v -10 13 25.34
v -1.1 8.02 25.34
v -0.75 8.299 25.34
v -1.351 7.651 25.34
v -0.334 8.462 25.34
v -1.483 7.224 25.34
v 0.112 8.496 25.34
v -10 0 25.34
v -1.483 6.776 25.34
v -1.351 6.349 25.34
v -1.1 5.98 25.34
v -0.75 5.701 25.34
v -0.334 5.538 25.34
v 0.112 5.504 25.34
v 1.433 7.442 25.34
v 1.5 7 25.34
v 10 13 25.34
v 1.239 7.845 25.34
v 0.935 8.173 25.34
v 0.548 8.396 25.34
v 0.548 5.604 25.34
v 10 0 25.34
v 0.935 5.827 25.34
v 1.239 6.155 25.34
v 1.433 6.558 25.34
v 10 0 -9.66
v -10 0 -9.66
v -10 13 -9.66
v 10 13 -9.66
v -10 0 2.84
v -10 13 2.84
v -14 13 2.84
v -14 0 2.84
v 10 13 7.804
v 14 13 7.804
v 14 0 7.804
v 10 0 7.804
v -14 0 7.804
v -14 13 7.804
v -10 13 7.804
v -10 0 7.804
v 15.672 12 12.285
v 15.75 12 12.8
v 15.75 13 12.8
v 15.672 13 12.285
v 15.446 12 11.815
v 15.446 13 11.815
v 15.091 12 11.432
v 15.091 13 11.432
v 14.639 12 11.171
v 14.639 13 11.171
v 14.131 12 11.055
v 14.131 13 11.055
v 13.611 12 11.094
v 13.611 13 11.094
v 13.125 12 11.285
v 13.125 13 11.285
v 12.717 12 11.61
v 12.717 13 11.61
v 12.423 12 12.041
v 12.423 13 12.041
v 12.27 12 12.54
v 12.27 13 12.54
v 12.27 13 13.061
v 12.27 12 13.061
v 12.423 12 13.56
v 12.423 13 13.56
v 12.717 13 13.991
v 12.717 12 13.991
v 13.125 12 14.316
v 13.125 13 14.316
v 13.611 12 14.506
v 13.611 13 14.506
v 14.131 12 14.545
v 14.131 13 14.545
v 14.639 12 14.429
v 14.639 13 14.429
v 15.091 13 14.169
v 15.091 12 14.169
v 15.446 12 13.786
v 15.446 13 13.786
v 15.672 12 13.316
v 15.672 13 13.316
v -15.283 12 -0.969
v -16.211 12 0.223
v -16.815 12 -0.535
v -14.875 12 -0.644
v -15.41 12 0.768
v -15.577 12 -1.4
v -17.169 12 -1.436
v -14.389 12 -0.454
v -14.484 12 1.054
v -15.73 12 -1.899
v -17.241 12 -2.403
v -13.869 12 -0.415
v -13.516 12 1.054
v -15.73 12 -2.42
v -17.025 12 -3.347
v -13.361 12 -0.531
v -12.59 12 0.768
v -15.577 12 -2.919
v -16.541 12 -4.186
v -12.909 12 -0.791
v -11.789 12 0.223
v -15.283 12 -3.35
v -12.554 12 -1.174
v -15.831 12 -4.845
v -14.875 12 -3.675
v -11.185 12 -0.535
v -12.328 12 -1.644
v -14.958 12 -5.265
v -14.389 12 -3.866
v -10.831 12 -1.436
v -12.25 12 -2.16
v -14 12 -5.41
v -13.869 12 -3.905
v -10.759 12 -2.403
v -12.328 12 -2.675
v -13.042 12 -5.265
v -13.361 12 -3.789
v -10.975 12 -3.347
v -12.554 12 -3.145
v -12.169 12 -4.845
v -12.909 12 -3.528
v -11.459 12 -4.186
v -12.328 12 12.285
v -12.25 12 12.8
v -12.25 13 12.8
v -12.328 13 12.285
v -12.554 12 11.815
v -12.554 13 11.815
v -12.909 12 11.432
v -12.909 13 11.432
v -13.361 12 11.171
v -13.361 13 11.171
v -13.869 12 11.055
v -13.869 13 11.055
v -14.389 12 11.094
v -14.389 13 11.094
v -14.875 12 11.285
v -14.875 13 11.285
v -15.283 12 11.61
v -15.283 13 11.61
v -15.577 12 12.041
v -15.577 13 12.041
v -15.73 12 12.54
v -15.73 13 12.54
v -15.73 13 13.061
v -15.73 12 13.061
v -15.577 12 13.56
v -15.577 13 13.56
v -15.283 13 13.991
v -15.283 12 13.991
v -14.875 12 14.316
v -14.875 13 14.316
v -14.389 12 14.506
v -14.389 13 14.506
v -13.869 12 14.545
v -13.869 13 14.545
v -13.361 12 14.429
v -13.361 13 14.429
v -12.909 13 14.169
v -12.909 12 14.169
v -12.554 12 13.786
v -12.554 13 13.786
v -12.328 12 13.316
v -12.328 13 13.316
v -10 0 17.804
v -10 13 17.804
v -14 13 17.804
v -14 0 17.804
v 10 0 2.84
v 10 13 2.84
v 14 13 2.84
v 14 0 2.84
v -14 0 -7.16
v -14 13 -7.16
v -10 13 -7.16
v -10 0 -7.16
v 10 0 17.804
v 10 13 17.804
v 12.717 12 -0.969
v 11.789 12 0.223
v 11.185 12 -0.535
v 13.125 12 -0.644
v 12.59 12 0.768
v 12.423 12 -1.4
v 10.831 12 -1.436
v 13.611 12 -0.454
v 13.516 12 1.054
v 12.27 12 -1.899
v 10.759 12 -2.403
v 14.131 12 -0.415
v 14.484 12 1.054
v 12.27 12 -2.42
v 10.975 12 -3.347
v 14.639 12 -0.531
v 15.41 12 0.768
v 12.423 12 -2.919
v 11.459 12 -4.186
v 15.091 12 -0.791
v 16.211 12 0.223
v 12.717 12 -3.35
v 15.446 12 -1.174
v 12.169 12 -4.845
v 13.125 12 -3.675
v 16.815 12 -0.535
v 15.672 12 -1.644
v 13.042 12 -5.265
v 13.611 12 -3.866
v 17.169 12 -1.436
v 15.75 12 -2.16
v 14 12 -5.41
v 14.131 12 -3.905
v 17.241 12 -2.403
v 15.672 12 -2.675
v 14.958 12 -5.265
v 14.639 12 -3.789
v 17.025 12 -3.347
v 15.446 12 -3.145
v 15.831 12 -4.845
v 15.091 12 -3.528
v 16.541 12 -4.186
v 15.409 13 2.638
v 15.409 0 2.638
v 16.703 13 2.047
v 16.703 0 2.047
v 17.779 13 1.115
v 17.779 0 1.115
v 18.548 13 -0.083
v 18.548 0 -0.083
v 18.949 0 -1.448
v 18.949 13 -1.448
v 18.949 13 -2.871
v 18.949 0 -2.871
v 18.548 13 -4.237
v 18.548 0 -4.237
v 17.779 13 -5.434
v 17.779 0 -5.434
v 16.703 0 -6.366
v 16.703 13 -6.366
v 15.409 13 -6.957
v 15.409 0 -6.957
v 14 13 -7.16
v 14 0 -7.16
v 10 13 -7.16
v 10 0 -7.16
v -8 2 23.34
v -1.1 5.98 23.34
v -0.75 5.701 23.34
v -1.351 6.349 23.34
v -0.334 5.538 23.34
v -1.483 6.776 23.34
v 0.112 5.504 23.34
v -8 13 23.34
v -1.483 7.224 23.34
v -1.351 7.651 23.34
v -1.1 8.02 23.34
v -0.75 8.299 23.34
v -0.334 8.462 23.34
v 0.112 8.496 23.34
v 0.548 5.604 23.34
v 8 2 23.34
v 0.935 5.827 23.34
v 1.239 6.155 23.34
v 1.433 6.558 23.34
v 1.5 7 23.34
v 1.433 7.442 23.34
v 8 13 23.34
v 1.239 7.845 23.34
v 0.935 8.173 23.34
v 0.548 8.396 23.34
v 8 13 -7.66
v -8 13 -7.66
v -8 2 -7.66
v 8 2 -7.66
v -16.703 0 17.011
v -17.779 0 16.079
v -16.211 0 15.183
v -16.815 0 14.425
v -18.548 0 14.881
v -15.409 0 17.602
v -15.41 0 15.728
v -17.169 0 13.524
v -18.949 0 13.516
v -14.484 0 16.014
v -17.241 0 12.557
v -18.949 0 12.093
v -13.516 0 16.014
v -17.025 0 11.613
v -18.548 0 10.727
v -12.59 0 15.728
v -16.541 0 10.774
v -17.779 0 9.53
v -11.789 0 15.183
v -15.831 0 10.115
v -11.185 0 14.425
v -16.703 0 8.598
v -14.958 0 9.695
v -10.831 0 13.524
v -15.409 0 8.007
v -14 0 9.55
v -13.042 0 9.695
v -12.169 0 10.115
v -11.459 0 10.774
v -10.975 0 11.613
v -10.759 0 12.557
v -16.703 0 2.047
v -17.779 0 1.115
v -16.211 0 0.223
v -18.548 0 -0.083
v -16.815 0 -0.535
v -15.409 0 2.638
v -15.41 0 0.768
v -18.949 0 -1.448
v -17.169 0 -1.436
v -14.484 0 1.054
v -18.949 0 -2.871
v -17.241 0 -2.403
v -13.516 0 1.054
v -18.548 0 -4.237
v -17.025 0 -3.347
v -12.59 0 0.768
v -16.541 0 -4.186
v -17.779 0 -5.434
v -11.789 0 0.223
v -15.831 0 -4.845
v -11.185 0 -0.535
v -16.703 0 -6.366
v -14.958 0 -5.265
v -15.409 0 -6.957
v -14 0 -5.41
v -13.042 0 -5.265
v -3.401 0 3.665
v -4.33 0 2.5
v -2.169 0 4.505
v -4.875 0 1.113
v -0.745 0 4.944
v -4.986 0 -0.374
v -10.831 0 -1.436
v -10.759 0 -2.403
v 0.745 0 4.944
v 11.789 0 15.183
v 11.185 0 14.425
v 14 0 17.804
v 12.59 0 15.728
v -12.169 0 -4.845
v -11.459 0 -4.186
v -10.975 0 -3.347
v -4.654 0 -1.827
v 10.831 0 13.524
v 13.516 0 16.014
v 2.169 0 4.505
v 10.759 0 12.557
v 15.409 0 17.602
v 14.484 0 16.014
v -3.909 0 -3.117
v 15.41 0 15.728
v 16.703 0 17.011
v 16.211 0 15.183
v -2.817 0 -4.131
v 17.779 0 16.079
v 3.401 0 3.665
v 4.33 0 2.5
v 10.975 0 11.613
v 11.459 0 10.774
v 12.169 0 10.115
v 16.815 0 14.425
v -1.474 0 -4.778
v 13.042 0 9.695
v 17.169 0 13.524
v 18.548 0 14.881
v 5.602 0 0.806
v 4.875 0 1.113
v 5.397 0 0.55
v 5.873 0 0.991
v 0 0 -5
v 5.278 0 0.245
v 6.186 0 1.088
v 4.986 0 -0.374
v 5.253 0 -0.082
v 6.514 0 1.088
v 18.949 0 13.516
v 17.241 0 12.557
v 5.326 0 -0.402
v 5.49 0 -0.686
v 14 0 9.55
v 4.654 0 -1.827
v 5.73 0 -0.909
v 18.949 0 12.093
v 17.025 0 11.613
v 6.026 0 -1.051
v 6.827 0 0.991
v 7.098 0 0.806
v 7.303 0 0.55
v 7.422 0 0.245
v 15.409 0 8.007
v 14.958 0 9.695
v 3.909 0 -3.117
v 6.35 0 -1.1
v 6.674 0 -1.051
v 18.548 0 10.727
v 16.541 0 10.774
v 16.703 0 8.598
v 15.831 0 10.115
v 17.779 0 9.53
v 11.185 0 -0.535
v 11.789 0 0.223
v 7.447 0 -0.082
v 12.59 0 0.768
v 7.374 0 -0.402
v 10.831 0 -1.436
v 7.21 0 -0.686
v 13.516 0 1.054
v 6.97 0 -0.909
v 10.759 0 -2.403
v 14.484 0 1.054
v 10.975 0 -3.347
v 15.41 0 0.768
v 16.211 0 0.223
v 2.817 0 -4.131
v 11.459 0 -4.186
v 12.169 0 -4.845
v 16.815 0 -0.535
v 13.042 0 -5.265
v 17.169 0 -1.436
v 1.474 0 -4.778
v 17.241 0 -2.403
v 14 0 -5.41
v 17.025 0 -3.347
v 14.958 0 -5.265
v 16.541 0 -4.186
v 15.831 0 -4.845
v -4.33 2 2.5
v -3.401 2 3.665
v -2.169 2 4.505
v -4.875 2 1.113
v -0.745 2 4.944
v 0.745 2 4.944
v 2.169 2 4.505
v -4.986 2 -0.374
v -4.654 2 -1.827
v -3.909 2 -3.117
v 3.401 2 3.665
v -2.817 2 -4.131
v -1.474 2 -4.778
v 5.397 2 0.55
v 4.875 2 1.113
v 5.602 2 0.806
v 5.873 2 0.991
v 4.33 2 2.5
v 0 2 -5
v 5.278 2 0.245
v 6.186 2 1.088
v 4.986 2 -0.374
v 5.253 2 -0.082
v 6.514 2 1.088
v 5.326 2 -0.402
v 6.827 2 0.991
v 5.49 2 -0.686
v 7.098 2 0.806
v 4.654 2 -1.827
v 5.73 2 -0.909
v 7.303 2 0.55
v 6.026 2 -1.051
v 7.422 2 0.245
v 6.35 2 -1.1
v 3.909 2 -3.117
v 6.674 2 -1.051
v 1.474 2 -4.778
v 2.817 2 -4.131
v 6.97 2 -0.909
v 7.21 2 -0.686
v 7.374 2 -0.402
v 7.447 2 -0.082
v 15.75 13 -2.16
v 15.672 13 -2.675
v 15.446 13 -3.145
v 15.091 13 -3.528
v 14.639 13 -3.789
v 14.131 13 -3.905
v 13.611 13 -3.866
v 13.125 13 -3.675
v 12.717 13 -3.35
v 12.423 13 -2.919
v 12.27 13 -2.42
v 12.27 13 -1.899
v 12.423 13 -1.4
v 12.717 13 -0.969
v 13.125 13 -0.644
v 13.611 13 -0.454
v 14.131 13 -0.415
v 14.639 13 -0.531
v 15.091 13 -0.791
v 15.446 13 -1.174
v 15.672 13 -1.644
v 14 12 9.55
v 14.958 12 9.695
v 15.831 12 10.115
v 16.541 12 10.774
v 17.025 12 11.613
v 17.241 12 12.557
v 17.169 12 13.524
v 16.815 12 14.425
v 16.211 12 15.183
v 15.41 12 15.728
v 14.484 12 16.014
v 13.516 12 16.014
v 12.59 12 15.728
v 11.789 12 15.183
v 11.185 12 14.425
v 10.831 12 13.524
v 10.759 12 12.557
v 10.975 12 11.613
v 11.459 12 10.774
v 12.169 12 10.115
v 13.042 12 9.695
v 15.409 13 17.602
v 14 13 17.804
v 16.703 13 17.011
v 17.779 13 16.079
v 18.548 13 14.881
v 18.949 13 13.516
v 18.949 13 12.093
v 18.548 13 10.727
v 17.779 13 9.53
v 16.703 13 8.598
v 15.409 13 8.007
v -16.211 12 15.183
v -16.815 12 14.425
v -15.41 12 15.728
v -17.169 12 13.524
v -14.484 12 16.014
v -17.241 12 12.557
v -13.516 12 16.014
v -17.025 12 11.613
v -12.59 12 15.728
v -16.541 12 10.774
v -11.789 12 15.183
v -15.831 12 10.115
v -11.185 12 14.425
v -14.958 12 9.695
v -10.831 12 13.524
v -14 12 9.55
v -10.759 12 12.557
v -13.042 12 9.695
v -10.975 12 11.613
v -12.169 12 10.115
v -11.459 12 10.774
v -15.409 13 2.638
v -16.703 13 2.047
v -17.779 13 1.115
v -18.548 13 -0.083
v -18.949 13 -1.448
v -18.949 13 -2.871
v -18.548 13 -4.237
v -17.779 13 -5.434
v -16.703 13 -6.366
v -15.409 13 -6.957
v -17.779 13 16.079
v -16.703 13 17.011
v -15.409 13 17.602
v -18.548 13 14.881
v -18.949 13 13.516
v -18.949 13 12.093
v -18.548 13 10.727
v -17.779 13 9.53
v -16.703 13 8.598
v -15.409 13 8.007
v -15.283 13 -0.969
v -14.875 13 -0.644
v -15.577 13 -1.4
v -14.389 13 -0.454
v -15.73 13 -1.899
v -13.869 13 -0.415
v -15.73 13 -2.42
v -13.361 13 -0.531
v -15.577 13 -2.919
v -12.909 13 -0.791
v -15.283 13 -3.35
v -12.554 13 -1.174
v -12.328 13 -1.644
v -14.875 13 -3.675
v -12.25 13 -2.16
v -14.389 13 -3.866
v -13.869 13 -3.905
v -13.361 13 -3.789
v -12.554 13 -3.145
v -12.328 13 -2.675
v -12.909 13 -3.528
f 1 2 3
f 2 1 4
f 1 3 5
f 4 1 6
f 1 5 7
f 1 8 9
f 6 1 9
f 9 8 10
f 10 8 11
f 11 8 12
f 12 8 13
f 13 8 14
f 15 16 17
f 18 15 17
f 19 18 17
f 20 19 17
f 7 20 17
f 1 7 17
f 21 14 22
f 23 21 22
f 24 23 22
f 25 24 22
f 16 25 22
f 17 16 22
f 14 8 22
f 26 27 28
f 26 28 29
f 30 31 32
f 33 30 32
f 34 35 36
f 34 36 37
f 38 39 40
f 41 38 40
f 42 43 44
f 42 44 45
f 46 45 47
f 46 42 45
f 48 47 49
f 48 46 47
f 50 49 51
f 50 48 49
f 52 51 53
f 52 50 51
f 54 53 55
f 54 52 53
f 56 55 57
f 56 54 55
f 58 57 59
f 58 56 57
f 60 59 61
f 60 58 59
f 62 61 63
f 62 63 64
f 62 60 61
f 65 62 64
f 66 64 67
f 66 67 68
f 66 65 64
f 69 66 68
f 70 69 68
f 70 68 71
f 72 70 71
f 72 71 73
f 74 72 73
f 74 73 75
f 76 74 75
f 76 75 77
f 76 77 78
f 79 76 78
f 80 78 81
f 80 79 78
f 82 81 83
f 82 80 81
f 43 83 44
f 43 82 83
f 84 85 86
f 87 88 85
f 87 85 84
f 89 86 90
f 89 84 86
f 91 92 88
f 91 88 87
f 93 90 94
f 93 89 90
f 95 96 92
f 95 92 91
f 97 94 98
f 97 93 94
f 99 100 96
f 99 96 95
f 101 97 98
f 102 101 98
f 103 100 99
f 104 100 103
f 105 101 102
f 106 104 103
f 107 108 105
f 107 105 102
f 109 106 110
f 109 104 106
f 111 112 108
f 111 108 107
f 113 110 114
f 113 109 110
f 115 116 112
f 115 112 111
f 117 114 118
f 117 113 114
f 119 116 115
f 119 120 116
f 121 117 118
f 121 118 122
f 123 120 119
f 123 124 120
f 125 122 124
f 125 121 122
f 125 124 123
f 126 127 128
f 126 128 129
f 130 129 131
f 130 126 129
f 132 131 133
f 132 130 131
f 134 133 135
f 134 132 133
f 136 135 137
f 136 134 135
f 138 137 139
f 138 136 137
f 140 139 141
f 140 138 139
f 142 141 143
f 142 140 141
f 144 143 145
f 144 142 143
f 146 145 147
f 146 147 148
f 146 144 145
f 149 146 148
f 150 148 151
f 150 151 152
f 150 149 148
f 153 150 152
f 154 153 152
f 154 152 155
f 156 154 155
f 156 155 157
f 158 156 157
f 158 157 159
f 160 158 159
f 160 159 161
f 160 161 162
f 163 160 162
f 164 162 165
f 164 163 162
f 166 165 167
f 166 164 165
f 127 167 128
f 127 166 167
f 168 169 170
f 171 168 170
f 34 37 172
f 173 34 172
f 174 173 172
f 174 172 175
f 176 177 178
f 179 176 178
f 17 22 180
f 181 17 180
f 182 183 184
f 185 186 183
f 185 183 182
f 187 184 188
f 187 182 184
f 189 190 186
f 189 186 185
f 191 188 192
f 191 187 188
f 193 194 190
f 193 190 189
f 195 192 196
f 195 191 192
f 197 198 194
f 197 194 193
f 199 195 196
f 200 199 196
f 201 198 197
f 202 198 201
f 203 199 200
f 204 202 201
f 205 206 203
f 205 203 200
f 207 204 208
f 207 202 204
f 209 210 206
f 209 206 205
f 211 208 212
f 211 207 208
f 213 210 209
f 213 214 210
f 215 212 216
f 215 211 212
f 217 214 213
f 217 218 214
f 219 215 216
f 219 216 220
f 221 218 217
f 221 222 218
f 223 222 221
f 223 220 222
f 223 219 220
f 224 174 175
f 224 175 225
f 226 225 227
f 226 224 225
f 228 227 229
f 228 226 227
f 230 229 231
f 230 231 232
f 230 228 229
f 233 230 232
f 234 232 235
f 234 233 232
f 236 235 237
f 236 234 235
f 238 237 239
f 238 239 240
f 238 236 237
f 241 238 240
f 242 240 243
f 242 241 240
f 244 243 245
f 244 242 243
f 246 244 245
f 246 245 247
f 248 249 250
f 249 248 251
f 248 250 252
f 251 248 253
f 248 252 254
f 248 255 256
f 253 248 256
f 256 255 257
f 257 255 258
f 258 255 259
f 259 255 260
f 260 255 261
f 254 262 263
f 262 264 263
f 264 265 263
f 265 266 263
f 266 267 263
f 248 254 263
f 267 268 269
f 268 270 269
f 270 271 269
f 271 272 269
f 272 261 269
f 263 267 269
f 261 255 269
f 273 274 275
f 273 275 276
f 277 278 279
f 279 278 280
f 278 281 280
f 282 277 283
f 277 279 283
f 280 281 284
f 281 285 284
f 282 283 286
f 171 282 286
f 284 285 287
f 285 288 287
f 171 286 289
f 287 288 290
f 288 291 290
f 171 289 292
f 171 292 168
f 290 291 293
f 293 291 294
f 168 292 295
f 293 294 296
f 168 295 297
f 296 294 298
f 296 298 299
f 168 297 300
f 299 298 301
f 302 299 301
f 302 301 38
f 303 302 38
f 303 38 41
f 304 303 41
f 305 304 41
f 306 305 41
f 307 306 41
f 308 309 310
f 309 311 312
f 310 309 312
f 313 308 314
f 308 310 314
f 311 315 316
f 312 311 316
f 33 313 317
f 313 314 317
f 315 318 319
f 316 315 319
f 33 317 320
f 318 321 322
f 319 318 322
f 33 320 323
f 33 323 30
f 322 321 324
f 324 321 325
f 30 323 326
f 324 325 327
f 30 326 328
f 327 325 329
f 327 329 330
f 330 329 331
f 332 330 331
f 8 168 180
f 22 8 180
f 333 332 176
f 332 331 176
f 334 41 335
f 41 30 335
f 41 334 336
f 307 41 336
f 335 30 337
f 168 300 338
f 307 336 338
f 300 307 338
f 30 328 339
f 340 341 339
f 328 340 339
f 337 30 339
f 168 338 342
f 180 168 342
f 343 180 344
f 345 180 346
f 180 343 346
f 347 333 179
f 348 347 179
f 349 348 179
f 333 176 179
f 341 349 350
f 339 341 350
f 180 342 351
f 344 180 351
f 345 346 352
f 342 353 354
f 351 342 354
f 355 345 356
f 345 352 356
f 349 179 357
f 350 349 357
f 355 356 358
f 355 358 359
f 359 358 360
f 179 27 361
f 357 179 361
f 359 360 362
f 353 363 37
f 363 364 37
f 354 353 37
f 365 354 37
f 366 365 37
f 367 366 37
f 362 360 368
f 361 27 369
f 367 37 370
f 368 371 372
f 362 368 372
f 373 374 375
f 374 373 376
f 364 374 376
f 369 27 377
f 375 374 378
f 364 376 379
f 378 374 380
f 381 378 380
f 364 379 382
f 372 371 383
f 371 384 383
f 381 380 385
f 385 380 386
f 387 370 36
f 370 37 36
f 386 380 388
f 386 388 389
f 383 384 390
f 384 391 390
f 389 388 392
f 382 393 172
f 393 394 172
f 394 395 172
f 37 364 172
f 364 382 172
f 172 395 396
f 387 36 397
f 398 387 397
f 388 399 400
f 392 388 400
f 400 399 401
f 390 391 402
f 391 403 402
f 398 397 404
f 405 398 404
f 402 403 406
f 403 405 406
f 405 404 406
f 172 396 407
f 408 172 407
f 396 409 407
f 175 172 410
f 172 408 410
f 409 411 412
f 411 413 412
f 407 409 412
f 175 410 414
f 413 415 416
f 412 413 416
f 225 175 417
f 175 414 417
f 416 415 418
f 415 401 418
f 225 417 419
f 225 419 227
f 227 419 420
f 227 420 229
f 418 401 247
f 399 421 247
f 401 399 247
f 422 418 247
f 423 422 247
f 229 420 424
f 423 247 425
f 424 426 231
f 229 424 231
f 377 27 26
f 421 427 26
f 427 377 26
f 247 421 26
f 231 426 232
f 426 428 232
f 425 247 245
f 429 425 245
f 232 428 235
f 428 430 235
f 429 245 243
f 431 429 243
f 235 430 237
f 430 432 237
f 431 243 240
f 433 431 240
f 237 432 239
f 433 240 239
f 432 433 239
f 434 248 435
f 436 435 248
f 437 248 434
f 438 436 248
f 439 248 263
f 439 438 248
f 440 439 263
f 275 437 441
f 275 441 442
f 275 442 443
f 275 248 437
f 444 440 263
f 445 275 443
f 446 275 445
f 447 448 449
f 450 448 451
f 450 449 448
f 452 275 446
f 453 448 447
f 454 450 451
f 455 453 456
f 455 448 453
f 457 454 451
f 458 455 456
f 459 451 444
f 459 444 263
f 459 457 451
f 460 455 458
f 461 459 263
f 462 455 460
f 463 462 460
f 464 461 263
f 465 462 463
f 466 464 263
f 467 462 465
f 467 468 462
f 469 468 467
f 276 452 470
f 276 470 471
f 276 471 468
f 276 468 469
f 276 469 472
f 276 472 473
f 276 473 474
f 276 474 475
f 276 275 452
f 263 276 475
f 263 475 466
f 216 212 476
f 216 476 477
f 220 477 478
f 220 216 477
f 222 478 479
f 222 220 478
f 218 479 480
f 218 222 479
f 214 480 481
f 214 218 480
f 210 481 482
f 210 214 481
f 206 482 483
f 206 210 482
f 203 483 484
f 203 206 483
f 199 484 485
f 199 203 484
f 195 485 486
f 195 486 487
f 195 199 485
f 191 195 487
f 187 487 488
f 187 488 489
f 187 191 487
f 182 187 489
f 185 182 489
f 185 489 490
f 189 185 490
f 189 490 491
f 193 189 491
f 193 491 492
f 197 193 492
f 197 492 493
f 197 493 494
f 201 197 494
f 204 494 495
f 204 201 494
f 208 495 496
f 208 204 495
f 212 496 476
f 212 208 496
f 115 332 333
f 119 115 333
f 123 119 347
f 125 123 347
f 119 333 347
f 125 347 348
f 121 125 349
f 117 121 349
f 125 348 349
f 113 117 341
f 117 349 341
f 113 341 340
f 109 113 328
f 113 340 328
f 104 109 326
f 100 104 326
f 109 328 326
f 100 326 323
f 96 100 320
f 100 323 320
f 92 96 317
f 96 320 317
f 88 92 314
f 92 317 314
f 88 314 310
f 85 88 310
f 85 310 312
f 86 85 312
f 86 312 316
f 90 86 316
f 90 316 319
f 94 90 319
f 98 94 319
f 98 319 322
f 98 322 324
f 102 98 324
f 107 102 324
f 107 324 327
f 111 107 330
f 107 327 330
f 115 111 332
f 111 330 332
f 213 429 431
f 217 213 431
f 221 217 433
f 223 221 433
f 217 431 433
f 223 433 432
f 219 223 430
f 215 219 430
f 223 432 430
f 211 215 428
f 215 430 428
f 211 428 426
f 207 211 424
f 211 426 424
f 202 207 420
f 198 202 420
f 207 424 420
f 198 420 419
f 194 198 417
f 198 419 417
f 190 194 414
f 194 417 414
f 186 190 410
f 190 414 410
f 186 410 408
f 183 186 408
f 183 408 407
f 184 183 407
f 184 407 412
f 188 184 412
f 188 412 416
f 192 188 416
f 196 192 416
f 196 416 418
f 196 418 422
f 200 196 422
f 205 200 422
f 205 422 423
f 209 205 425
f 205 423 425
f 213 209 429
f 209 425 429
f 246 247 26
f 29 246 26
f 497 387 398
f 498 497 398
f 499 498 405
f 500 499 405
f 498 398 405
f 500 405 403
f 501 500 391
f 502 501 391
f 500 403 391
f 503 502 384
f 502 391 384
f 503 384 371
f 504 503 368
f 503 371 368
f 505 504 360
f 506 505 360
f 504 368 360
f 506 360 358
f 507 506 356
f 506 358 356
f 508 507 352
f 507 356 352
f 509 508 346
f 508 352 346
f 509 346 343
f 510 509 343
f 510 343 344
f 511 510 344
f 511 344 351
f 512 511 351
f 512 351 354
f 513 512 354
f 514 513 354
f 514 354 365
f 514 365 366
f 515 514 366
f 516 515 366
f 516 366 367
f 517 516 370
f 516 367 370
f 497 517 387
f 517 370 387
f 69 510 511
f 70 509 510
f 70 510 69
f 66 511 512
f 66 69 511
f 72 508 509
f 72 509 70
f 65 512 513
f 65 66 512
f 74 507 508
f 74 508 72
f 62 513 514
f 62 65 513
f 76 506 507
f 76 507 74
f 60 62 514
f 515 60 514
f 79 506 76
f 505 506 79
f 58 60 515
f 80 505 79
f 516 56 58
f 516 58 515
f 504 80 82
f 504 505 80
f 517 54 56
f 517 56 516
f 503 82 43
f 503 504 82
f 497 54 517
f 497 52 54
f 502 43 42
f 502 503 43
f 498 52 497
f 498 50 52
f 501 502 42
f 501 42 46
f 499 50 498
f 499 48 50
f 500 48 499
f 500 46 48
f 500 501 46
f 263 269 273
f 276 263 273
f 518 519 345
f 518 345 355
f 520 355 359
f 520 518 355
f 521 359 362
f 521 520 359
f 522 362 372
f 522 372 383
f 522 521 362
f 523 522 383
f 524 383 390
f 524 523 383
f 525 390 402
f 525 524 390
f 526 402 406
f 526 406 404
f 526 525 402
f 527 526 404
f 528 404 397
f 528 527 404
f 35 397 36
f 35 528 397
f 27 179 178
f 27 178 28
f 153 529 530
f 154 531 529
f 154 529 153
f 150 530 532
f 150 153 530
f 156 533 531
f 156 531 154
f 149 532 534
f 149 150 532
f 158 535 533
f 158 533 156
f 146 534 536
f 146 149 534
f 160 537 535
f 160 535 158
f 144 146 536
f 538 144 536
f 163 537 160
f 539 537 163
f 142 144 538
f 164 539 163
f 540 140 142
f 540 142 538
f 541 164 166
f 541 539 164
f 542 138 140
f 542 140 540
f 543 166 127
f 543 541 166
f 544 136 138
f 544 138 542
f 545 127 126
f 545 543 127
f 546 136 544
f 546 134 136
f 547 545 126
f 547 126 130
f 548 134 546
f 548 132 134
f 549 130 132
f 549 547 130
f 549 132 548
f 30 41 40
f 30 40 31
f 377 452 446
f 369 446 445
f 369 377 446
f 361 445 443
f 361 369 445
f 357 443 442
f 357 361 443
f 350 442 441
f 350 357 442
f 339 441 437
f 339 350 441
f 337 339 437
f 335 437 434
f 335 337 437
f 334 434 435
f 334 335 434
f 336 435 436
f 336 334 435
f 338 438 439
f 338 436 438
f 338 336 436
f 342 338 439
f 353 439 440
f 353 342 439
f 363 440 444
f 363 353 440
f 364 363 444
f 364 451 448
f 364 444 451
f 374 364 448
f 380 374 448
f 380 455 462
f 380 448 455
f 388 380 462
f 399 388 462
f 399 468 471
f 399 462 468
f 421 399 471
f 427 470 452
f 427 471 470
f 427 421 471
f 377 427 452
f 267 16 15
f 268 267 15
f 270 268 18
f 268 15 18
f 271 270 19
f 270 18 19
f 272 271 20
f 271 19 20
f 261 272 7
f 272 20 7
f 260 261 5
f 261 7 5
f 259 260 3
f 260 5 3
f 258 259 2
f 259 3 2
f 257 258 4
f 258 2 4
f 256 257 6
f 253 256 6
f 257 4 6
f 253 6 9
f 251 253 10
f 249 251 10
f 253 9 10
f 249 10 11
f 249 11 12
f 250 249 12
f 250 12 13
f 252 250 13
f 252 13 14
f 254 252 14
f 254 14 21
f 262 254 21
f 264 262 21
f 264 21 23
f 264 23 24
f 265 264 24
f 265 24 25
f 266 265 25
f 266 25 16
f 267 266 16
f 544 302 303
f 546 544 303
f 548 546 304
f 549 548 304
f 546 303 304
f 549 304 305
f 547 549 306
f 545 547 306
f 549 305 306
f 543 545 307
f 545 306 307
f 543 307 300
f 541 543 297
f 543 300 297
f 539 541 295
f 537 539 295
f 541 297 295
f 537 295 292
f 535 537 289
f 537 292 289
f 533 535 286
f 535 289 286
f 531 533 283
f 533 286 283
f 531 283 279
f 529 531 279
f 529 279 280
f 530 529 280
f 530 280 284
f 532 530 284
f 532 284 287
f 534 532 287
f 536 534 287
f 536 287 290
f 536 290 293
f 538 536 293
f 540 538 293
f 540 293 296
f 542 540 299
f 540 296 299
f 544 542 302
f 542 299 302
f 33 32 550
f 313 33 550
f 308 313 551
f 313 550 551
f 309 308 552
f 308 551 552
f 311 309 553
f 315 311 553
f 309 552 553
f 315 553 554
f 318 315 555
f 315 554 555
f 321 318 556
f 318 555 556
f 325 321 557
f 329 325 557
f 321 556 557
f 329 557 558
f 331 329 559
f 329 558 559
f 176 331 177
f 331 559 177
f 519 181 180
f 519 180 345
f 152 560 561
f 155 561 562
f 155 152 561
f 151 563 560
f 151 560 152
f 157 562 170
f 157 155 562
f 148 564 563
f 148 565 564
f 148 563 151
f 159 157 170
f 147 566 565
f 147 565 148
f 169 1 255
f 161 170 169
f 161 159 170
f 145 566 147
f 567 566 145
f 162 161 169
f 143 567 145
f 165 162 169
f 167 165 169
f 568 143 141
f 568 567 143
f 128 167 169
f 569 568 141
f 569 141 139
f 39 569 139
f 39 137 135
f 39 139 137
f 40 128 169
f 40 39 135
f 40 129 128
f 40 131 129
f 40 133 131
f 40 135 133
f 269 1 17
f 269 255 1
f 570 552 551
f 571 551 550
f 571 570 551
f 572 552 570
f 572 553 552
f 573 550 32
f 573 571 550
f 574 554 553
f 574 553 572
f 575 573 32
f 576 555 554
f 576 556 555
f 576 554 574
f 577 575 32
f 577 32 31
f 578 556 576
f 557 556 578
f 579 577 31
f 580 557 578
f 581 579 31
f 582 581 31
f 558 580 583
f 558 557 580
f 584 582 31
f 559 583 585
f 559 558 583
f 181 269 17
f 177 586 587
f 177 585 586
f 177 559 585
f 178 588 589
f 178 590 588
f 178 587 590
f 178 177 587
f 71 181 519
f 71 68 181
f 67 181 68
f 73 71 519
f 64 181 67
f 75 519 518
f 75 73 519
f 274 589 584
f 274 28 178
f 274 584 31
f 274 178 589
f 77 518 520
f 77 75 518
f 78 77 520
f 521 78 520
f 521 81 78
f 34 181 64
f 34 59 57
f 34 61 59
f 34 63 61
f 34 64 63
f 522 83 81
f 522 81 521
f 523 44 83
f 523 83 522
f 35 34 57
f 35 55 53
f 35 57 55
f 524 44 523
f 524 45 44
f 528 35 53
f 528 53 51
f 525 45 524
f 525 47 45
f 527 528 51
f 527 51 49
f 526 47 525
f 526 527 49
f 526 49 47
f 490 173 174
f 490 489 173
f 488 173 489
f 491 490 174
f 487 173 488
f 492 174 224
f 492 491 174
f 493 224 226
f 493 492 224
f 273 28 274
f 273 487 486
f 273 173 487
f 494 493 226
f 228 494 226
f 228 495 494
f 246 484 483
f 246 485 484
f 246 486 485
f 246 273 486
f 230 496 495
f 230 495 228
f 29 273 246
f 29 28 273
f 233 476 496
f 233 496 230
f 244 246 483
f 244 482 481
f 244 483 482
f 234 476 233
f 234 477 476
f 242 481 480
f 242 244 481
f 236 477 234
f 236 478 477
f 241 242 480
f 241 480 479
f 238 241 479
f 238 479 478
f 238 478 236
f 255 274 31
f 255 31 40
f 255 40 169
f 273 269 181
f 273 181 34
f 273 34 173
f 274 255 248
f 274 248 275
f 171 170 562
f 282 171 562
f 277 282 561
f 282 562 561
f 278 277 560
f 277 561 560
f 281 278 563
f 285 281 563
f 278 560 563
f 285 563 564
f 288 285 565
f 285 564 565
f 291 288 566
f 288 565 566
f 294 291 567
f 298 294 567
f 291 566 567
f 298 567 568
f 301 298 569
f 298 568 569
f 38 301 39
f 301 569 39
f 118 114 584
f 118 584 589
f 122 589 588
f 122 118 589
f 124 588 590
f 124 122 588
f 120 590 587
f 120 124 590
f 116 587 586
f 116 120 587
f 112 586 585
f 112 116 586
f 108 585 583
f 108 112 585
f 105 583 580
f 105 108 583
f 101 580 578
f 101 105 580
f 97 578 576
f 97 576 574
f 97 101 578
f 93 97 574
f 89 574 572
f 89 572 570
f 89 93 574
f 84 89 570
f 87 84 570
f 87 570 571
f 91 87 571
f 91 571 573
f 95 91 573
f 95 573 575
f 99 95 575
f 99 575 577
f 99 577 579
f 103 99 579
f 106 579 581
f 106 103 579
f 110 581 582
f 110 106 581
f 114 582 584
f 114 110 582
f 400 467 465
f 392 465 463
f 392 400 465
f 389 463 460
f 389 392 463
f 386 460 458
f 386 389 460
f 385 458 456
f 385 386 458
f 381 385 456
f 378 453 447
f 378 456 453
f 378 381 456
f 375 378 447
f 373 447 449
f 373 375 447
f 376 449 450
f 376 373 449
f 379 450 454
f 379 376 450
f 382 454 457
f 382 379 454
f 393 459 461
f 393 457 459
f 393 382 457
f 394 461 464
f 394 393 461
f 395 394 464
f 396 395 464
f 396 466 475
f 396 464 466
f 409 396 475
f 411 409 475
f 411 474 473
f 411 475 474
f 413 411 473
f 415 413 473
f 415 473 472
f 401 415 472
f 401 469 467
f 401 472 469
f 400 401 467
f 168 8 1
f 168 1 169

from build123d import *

# Parameters (mm, degrees)
SKETCH1_W              = 20
SKETCH1_H              = 35
SKETCH1_R              = 5
SKETCH1_R_2            = 1.1
BOSS_EXTRUDE1_DEPTH    = 13
SKETCH5_W              = 16
SKETCH5_H              = 31
CUT_EXTRUDE1_DEPTH     = 11
CUT_EXTRUDE2_REACH     = 40.652
SKETCH7_R              = 1.5
BOSS_EXTRUDE3_DEPTH    = 13
SKETCH11_R             = 3.25
CUT_EXTRUDE4_DEPTH     = 12
CUT_EXTRUDE5_START     = 12
CUT_EXTRUDE5_OUTLINE_R = 1.75
CUT_EXTRUDE5_DEPTH     = 1


# Read off the part's stored shape, not the designer's step: Cut-Extrude5
with BuildPart() as part:
    # Sketch1 → Boss-Extrude1 (new body)
    with BuildSketch(Plane(origin=(0, 0, 0), x_dir=(1, 0, 0), z_dir=(0, 1, 0))):
        with Locations((0, -7.840328725)):
            Rectangle(SKETCH1_W, SKETCH1_H)
        with Locations(Location((0, 0, 0), (0, 0, 90))):
            Circle(SKETCH1_R, mode=Mode.SUBTRACT)
        with Locations(Location((6.35, 0, 0), (0, 0, 90))):
            Circle(SKETCH1_R_2, mode=Mode.SUBTRACT)
    extrude(amount=BOSS_EXTRUDE1_DEPTH)

    # Sketch5 → Cut-Extrude1 (cut)
    with BuildSketch(Plane(origin=(0, 13, 0), x_dir=(1, 0, 0), z_dir=(0, 1, 0))):
        with Locations((0, -7.840328725)):
            Rectangle(SKETCH5_W, SKETCH5_H)
    extrude(amount=-CUT_EXTRUDE1_DEPTH, mode=Mode.SUBTRACT)

    # Sketch7 → Cut-Extrude2 (cut, up to next)
    with BuildSketch(Plane.XY.offset(25.340328725), mode=Mode.PRIVATE) as cut_extrude2_sk1:
        with Locations((0, 7)):
            Circle(SKETCH7_R)
    cut_extrude2_tool1 = extrude(cut_extrude2_sk1.sketch, amount=-CUT_EXTRUDE2_REACH, mode=Mode.PRIVATE) & part.part
    add(cut_extrude2_tool1.solids().sort_by_distance((0, 7, 25.340329))[0], mode=Mode.SUBTRACT)

    # Sketch9 → Boss-Extrude3 (add, through all)
    with BuildSketch(Plane(origin=(0, 13, 0), x_dir=(1, 0, 0), z_dir=(0, 1, 0))):
        with BuildLine():
            Line((-14, 7.159671275), (-10, 7.159671275))
            Line((-10, 7.159671275), (-10, -2.840328725))
            Line((-10, -2.840328725), (-14, -2.840328725))
            ThreePointArc((-14, -2.840328725), (-19, 2.159671275), (-14, 7.159671275))
        make_face()
        with BuildLine():
            Line((-14, -7.804369497), (-10, -7.804369497))
            Line((-10, -7.804369497), (-10, -17.804369497))
            Line((-10, -17.804369497), (-14, -17.804369497))
            ThreePointArc((-14, -17.804369497), (-19, -12.804369497), (-14, -7.804369497))
        make_face()
        with BuildLine():
            Line((10, -7.804369497), (10, -17.804369497))
            Line((10, -17.804369497), (14, -17.804369497))
            ThreePointArc((14, -17.804369497), (19, -12.804369497), (14, -7.804369497))
            Line((14, -7.804369497), (10, -7.804369497))
        make_face()
        with BuildLine():
            Line((10, 7.159671275), (10, -2.840328725))
            Line((10, -2.840328725), (14, -2.840328725))
            ThreePointArc((14, -2.840328725), (19, 2.159671275), (14, 7.159671275))
            Line((14, 7.159671275), (10, 7.159671275))
        make_face()
    extrude(amount=-BOSS_EXTRUDE3_DEPTH)

    # Sketch11 → Cut-Extrude4 (cut)
    with BuildSketch(Plane.XZ):
        with Locations(Location((-14, 12.800328725, 0), (0, 0, 270))):
            Circle(SKETCH11_R)
        with Locations(Location((-14, -2.159671275, 0), (0, 0, 270))):
            Circle(SKETCH11_R)
        with Locations(Location((14, 12.800328725, 0), (0, 0, 270))):
            Circle(SKETCH11_R)
        with Locations(Location((14, -2.159671275, 0), (0, 0, 270))):
            Circle(SKETCH11_R)
    extrude(amount=-CUT_EXTRUDE4_DEPTH, mode=Mode.SUBTRACT)

    # Cut-Extrude5 outline → Cut-Extrude5 (cut)
    with BuildSketch(Plane(origin=(0, 0, 0), x_dir=(1, 0, 0), z_dir=(0, 1, 0)).offset(CUT_EXTRUDE5_START)):
        with Locations((-14, 2.159671275)):
            Circle(CUT_EXTRUDE5_OUTLINE_R)
        with Locations((14, -12.800328725)):
            Circle(CUT_EXTRUDE5_OUTLINE_R)
        with Locations((14, 2.159671275)):
            Circle(CUT_EXTRUDE5_OUTLINE_R)
        with Locations((-14, -12.800328725)):
            Circle(CUT_EXTRUDE5_OUTLINE_R)
    extrude(amount=CUT_EXTRUDE5_DEPTH, mode=Mode.SUBTRACT)


solid = part.part
